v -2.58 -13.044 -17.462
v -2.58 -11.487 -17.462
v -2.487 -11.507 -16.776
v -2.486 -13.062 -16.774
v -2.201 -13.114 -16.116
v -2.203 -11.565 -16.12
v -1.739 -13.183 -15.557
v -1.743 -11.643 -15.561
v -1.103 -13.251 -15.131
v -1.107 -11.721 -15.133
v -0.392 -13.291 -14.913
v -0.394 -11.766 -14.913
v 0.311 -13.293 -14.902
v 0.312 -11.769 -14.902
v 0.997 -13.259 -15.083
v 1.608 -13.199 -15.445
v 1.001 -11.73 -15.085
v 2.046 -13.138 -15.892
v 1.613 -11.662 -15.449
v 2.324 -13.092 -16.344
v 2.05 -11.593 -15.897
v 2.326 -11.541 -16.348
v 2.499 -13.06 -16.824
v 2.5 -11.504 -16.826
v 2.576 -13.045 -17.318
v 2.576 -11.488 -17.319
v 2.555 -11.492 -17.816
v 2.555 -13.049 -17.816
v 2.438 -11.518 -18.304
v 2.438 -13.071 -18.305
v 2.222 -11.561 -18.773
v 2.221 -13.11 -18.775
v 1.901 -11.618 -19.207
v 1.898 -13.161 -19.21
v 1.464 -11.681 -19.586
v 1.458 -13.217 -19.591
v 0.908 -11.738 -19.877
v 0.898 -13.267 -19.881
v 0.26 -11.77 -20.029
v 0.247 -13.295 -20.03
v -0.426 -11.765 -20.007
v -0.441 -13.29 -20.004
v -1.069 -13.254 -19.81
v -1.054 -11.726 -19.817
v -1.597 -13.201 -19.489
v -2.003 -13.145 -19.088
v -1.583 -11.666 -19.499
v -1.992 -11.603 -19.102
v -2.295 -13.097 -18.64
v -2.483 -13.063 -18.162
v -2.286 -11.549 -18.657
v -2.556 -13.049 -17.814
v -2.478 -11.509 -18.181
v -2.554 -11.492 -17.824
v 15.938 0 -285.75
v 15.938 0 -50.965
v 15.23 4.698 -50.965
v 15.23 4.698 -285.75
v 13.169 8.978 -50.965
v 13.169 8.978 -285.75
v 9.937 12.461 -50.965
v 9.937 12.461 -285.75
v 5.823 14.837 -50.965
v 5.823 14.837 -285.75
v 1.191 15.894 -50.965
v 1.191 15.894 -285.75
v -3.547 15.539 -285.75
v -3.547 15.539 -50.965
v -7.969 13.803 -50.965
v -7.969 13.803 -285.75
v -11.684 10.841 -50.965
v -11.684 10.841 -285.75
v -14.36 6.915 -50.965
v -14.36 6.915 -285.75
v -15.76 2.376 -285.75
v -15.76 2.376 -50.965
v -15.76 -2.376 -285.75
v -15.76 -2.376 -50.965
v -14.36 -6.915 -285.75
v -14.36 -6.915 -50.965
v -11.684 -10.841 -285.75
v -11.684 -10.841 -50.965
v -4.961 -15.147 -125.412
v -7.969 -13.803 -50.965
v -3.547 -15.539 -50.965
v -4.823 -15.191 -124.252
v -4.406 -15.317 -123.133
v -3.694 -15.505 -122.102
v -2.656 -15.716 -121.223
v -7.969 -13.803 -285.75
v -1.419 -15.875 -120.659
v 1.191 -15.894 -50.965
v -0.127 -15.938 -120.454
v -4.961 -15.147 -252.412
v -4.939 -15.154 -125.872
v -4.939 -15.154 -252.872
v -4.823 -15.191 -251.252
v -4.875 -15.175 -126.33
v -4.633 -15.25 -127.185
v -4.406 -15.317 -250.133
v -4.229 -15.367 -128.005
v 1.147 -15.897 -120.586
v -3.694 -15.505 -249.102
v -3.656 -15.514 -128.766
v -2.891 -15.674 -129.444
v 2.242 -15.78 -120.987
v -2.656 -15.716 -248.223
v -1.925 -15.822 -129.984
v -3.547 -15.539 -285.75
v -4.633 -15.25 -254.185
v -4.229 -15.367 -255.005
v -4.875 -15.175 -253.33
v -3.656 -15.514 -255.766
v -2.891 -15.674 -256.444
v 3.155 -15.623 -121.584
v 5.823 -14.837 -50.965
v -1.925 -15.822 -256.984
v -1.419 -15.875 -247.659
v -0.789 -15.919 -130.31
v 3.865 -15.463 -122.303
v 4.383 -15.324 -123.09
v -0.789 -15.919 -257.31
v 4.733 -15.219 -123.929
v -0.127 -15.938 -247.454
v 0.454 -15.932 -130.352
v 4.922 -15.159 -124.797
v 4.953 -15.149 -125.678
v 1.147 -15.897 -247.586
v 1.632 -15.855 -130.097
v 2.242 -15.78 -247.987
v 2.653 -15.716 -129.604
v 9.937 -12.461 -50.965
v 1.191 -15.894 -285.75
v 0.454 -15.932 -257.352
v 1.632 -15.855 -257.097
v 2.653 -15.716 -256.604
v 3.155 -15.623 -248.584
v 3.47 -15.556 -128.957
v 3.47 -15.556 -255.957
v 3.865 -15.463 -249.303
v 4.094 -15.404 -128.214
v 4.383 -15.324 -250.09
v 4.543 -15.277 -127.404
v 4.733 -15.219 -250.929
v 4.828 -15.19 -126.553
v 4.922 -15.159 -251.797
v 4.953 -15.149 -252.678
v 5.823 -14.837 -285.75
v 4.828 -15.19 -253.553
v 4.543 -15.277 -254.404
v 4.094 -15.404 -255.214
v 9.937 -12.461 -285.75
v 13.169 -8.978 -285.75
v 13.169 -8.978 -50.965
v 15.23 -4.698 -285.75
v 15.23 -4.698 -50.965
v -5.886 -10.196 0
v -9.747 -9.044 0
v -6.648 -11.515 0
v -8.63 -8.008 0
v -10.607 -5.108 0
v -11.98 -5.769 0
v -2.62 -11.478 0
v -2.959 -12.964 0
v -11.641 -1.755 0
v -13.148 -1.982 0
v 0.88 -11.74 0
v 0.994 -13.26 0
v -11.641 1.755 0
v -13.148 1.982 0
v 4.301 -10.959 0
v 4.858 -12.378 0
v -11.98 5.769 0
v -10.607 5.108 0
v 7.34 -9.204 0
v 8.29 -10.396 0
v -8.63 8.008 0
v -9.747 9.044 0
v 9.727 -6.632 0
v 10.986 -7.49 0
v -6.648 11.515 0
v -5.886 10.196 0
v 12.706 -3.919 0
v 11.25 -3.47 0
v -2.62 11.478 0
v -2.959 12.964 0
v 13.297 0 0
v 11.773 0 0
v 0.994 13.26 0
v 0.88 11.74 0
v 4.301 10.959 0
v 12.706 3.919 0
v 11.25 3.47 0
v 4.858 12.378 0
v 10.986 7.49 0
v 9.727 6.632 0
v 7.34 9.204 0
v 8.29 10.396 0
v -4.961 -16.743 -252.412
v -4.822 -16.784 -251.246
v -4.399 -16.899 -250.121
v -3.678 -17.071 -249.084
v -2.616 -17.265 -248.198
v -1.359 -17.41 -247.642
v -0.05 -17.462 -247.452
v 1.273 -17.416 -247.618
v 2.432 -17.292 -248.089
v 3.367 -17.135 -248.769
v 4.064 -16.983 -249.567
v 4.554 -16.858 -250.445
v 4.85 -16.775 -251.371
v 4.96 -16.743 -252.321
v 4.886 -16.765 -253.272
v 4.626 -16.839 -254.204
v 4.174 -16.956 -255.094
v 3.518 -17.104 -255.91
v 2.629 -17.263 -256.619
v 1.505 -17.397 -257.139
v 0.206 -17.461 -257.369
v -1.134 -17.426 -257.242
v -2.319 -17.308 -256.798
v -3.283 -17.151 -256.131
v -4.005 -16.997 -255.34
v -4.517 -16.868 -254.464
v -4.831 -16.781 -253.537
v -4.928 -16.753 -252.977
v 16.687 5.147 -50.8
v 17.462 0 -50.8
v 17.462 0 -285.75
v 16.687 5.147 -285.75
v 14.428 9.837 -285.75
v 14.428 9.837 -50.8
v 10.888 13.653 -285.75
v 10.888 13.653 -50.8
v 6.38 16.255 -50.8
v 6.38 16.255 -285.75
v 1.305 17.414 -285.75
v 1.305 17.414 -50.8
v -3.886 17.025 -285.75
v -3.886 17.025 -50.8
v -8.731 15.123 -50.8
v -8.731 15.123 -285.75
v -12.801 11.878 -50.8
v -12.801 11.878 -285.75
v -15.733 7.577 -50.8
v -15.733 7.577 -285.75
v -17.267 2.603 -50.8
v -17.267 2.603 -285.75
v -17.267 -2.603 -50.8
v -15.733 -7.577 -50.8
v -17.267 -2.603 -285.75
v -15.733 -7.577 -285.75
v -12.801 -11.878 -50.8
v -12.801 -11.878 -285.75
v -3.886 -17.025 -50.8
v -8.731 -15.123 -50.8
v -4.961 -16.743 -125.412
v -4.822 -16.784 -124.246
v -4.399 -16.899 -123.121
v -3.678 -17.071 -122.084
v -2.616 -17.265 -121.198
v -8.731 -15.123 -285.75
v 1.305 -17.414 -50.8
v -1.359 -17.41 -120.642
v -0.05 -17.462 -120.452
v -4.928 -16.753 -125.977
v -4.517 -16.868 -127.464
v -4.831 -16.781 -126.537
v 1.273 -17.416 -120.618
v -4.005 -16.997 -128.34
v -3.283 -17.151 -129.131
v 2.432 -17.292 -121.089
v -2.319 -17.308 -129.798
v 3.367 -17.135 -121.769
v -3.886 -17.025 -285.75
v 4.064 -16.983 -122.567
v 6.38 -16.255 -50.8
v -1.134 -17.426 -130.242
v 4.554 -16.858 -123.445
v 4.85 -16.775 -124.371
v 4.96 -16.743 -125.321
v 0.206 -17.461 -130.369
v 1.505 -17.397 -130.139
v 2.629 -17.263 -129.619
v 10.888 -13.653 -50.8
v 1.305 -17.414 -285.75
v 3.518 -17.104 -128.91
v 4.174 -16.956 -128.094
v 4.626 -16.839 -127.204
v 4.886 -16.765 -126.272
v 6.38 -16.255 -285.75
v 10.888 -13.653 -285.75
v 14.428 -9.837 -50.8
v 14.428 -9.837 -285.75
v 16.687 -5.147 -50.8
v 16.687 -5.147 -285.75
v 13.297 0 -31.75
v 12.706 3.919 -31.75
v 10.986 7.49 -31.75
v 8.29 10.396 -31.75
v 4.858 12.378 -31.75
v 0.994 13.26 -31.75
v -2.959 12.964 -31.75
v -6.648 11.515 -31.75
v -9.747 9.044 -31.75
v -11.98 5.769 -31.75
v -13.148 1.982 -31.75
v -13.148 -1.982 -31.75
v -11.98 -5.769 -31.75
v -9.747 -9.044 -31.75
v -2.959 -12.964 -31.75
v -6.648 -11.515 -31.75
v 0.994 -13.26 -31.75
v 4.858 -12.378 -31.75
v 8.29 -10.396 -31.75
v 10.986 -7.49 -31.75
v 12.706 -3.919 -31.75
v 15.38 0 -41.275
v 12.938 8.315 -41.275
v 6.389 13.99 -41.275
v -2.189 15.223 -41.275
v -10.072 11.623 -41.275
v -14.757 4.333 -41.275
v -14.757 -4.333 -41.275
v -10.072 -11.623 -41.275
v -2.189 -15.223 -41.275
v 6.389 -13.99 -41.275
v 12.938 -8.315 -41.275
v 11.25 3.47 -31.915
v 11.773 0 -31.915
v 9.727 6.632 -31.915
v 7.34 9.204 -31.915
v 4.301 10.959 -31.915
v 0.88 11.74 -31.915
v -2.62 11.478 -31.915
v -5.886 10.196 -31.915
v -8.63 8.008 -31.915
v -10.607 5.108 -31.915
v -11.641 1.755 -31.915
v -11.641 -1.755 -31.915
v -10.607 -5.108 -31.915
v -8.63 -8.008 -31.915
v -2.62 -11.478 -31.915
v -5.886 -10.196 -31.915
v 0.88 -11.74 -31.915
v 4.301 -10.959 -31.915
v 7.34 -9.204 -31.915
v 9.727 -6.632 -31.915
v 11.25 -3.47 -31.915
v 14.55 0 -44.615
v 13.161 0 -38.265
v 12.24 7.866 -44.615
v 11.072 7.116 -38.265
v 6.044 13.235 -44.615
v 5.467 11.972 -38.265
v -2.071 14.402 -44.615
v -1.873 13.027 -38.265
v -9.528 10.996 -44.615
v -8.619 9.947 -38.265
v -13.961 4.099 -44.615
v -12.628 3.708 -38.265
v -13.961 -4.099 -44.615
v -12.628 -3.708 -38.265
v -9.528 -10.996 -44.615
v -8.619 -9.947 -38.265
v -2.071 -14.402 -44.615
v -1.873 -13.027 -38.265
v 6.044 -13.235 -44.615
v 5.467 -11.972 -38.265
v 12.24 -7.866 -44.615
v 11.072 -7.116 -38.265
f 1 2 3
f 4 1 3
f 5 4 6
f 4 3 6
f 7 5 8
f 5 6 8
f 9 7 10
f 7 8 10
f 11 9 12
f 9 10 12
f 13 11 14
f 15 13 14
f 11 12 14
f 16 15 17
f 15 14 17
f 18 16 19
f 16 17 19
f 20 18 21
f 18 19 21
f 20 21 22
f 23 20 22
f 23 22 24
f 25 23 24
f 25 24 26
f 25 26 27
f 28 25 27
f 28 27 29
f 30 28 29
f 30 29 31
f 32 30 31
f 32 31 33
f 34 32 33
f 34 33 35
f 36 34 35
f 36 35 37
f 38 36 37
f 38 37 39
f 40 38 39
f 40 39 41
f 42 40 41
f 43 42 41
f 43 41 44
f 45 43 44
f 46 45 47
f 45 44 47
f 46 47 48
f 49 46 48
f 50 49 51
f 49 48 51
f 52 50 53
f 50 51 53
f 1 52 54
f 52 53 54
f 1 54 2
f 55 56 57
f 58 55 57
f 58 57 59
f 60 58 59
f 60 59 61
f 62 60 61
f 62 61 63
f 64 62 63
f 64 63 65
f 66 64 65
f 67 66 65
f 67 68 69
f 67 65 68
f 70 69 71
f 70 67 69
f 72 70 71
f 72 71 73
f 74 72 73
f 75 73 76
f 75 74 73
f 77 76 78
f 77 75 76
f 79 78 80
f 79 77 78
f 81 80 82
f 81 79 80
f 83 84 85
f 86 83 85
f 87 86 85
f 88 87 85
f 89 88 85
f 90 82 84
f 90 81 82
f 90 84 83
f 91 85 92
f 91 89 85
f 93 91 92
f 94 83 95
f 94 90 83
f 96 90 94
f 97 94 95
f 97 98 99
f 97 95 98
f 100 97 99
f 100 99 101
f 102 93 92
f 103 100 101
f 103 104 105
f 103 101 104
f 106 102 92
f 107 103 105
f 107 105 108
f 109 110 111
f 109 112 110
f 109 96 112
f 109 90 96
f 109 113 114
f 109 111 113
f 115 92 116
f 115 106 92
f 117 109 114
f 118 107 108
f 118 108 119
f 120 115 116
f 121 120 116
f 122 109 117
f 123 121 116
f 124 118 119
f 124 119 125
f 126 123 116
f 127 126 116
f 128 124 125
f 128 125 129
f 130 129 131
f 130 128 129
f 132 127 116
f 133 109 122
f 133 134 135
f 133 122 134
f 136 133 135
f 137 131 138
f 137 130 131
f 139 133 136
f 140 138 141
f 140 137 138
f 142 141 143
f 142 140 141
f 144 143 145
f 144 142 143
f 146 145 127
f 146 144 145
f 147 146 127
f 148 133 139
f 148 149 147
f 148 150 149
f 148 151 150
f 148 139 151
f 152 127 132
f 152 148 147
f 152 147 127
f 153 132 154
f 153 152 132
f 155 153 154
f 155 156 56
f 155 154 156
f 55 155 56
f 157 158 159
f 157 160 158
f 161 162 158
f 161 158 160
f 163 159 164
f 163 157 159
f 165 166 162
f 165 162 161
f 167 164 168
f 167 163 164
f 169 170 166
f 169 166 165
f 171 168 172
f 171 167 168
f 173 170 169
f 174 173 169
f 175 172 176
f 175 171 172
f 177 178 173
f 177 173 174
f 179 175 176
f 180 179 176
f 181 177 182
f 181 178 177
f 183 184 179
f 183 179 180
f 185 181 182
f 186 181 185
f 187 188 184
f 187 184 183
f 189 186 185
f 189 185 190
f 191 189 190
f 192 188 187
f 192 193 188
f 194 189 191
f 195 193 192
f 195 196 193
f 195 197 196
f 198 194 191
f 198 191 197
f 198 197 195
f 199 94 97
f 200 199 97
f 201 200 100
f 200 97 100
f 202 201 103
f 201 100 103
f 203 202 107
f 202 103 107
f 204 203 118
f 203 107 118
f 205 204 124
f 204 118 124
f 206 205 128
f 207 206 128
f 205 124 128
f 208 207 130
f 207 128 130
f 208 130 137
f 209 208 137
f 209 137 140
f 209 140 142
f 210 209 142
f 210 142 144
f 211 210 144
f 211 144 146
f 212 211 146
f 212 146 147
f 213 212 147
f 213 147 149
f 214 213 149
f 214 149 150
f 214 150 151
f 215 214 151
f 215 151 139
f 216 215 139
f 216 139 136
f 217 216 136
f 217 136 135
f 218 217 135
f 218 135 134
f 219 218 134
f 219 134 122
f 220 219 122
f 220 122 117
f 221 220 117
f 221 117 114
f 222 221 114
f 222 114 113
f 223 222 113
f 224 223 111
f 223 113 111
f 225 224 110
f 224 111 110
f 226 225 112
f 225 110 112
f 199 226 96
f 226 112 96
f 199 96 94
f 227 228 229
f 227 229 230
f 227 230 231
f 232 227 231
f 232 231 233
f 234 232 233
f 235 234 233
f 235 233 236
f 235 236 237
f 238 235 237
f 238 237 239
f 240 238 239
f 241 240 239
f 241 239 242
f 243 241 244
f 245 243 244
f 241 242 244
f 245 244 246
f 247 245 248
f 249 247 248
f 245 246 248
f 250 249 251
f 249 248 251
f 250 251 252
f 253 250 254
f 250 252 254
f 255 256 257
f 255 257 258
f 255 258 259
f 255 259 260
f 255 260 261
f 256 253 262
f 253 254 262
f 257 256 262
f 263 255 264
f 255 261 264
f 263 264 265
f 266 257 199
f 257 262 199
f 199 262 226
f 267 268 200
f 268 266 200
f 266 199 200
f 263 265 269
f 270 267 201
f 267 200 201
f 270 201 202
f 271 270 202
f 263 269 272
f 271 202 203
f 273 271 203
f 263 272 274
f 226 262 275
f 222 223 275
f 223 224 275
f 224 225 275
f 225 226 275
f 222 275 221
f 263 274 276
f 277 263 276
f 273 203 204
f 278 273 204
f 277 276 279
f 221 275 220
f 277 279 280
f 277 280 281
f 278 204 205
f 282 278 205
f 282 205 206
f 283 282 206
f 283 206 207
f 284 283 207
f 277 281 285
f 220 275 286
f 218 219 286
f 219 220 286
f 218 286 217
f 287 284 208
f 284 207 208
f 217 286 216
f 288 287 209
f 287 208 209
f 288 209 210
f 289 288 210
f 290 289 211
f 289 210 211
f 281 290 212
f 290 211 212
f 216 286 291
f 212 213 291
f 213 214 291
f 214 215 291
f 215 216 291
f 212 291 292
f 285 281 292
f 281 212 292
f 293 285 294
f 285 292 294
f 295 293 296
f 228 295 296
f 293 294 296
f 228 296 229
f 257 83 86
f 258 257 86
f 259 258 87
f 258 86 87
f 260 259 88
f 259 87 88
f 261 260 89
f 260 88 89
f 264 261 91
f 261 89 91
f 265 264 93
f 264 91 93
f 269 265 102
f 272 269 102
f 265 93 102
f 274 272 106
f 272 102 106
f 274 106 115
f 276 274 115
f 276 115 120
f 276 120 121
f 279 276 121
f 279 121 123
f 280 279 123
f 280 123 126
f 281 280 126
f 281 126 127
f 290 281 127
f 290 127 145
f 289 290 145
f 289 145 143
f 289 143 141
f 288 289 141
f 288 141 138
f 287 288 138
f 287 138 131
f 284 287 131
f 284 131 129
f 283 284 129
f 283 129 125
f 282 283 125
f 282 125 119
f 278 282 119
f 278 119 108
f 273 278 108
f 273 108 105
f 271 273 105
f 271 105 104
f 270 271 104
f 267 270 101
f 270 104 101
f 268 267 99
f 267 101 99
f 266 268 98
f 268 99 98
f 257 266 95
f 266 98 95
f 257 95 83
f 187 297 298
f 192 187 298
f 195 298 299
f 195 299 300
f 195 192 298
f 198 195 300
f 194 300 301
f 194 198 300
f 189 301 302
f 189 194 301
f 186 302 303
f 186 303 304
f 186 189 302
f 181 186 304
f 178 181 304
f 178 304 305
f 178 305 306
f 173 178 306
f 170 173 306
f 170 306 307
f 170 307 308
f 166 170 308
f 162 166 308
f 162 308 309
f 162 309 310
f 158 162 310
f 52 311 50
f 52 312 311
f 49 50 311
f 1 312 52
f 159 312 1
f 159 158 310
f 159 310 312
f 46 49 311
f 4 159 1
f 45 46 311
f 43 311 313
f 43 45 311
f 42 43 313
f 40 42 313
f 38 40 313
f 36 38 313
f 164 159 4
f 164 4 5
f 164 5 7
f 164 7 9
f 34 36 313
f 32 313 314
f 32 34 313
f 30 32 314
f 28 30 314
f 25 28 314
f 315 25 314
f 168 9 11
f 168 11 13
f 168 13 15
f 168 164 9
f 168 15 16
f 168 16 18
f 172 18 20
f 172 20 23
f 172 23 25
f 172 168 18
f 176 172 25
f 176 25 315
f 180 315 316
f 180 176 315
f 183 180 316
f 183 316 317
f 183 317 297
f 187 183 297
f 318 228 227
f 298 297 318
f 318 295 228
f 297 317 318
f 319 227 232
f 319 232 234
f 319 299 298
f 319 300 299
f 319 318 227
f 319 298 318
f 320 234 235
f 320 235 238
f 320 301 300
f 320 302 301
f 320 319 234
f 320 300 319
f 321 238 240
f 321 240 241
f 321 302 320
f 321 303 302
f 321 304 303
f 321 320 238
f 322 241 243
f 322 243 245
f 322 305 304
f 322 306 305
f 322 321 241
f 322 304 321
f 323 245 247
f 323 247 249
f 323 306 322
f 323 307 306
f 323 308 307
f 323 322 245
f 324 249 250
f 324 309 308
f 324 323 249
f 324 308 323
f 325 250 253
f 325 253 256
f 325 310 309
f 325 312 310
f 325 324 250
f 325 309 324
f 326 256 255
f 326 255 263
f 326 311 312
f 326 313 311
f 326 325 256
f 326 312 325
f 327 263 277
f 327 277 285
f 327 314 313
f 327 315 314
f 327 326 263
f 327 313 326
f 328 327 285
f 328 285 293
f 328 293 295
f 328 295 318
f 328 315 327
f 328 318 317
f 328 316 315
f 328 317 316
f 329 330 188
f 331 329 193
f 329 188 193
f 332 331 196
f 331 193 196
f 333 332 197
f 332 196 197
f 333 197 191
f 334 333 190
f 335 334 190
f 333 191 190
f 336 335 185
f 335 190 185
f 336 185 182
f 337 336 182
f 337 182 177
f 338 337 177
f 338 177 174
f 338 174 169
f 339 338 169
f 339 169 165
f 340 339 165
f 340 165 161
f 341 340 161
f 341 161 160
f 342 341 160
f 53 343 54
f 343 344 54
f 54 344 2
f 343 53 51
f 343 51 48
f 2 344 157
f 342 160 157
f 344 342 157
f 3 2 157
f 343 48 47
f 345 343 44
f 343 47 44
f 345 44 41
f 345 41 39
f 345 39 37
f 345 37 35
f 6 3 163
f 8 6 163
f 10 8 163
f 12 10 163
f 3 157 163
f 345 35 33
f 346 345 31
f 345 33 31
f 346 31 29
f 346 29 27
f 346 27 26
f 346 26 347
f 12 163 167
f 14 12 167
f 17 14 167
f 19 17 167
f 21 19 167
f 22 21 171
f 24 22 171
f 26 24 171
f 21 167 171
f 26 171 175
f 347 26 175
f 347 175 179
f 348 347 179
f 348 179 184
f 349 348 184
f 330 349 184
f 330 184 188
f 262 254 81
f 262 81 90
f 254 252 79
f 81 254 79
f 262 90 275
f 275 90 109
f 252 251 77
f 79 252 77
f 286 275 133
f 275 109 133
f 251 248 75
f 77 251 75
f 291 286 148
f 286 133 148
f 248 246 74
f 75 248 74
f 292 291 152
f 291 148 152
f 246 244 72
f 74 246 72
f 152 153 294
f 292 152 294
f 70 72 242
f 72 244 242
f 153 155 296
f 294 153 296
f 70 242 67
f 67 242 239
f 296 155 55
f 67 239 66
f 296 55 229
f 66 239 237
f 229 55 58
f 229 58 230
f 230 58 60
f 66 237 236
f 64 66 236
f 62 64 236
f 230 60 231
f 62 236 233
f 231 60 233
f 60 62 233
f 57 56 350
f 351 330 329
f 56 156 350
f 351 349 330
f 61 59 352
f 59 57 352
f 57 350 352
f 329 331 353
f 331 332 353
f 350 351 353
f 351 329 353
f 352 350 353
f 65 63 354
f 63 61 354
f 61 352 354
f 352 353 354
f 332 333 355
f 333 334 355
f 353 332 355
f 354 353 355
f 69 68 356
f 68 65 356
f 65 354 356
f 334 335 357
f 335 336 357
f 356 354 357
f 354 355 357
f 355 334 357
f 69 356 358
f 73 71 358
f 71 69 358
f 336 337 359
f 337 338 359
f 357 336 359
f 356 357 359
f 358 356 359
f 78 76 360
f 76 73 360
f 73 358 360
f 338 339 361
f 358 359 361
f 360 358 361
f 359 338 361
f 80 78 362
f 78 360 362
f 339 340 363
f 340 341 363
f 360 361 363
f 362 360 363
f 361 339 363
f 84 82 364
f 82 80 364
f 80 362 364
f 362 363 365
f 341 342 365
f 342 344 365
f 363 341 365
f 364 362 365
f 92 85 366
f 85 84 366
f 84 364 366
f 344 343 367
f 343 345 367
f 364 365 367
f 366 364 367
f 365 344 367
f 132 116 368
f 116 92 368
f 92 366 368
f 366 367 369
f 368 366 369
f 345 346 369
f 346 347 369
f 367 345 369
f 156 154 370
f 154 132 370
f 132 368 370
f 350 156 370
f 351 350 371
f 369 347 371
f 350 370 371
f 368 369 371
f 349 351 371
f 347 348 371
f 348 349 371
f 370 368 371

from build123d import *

# Parameters (mm, degrees)
F0_R      = 13.2969
F1_DEPTH  = 31.75
F3_R      = 17.4625
F4_DEPTH  = 234.95
F4_FACE_R = 17.4625
F1_FACE_R = 13.2969
F6_T      = -1.524
F12_D     = 9.92124
F12_DEPTH = 6.35
F12_TIP   = 2.980641204
F13_D     = 5.159375
F13_DEPTH = 6.35
F13_TIP   = 1.5500326281


with BuildPart() as f1:
    # F0 (on Top) → F1 (new body)
    with BuildSketch(Plane.XY):
        Circle(F0_R)
    extrude(amount=-F1_DEPTH)



with BuildPart() as f4:
    # F3 (on offset) → F4 (new body)
    with BuildSketch(Plane.XY.offset(-285.75)):
        Circle(F3_R)
    extrude(amount=F4_DEPTH)


with BuildPart() as f1_1:
    add(f1.part)

    add(f4.part)  # F5 merges F4
    # F4_face (on face) → F5 section 0
    with BuildSketch(Plane.XY.offset(-50.8)):
        Circle(F4_FACE_R)
    # F1_face (on face) → F5 section 1
    with BuildSketch(Plane(origin=(0, 0, -31.75), x_dir=(1, 0, 0), z_dir=(0, 0, -1))):
        Circle(F1_FACE_R)
    loft()

    # F6
    f6_openings = [f1_1.faces().sort_by_distance(p)[0] for p in [
        (0, 0, 0),
        (0, 0, -285.75),
    ]]
    offset(amount=F6_T, openings=f6_openings, kind=Kind.INTERSECTION)

    # F12
    with Locations(Plane.XZ.offset(17.4625)):
        with Locations((0, -125.4125), (0, -252.4125)):
            Hole(F12_D / 2, depth=F12_DEPTH)
            with Locations((0, 0, -(F12_DEPTH + F12_TIP / 2))):  # 118° drill point
                Cone(0, F12_D / 2, F12_TIP, mode=Mode.SUBTRACT)

    # F13
    with Locations(Plane.XZ.offset(13.2969)):
        with Locations((0, -17.4625)):
            Hole(F13_D / 2, depth=F13_DEPTH)
            with Locations((0, 0, -(F13_DEPTH + F13_TIP / 2))):  # 118° drill point
                Cone(0, F13_D / 2, F13_TIP, mode=Mode.SUBTRACT)


solid = f1_1.part
